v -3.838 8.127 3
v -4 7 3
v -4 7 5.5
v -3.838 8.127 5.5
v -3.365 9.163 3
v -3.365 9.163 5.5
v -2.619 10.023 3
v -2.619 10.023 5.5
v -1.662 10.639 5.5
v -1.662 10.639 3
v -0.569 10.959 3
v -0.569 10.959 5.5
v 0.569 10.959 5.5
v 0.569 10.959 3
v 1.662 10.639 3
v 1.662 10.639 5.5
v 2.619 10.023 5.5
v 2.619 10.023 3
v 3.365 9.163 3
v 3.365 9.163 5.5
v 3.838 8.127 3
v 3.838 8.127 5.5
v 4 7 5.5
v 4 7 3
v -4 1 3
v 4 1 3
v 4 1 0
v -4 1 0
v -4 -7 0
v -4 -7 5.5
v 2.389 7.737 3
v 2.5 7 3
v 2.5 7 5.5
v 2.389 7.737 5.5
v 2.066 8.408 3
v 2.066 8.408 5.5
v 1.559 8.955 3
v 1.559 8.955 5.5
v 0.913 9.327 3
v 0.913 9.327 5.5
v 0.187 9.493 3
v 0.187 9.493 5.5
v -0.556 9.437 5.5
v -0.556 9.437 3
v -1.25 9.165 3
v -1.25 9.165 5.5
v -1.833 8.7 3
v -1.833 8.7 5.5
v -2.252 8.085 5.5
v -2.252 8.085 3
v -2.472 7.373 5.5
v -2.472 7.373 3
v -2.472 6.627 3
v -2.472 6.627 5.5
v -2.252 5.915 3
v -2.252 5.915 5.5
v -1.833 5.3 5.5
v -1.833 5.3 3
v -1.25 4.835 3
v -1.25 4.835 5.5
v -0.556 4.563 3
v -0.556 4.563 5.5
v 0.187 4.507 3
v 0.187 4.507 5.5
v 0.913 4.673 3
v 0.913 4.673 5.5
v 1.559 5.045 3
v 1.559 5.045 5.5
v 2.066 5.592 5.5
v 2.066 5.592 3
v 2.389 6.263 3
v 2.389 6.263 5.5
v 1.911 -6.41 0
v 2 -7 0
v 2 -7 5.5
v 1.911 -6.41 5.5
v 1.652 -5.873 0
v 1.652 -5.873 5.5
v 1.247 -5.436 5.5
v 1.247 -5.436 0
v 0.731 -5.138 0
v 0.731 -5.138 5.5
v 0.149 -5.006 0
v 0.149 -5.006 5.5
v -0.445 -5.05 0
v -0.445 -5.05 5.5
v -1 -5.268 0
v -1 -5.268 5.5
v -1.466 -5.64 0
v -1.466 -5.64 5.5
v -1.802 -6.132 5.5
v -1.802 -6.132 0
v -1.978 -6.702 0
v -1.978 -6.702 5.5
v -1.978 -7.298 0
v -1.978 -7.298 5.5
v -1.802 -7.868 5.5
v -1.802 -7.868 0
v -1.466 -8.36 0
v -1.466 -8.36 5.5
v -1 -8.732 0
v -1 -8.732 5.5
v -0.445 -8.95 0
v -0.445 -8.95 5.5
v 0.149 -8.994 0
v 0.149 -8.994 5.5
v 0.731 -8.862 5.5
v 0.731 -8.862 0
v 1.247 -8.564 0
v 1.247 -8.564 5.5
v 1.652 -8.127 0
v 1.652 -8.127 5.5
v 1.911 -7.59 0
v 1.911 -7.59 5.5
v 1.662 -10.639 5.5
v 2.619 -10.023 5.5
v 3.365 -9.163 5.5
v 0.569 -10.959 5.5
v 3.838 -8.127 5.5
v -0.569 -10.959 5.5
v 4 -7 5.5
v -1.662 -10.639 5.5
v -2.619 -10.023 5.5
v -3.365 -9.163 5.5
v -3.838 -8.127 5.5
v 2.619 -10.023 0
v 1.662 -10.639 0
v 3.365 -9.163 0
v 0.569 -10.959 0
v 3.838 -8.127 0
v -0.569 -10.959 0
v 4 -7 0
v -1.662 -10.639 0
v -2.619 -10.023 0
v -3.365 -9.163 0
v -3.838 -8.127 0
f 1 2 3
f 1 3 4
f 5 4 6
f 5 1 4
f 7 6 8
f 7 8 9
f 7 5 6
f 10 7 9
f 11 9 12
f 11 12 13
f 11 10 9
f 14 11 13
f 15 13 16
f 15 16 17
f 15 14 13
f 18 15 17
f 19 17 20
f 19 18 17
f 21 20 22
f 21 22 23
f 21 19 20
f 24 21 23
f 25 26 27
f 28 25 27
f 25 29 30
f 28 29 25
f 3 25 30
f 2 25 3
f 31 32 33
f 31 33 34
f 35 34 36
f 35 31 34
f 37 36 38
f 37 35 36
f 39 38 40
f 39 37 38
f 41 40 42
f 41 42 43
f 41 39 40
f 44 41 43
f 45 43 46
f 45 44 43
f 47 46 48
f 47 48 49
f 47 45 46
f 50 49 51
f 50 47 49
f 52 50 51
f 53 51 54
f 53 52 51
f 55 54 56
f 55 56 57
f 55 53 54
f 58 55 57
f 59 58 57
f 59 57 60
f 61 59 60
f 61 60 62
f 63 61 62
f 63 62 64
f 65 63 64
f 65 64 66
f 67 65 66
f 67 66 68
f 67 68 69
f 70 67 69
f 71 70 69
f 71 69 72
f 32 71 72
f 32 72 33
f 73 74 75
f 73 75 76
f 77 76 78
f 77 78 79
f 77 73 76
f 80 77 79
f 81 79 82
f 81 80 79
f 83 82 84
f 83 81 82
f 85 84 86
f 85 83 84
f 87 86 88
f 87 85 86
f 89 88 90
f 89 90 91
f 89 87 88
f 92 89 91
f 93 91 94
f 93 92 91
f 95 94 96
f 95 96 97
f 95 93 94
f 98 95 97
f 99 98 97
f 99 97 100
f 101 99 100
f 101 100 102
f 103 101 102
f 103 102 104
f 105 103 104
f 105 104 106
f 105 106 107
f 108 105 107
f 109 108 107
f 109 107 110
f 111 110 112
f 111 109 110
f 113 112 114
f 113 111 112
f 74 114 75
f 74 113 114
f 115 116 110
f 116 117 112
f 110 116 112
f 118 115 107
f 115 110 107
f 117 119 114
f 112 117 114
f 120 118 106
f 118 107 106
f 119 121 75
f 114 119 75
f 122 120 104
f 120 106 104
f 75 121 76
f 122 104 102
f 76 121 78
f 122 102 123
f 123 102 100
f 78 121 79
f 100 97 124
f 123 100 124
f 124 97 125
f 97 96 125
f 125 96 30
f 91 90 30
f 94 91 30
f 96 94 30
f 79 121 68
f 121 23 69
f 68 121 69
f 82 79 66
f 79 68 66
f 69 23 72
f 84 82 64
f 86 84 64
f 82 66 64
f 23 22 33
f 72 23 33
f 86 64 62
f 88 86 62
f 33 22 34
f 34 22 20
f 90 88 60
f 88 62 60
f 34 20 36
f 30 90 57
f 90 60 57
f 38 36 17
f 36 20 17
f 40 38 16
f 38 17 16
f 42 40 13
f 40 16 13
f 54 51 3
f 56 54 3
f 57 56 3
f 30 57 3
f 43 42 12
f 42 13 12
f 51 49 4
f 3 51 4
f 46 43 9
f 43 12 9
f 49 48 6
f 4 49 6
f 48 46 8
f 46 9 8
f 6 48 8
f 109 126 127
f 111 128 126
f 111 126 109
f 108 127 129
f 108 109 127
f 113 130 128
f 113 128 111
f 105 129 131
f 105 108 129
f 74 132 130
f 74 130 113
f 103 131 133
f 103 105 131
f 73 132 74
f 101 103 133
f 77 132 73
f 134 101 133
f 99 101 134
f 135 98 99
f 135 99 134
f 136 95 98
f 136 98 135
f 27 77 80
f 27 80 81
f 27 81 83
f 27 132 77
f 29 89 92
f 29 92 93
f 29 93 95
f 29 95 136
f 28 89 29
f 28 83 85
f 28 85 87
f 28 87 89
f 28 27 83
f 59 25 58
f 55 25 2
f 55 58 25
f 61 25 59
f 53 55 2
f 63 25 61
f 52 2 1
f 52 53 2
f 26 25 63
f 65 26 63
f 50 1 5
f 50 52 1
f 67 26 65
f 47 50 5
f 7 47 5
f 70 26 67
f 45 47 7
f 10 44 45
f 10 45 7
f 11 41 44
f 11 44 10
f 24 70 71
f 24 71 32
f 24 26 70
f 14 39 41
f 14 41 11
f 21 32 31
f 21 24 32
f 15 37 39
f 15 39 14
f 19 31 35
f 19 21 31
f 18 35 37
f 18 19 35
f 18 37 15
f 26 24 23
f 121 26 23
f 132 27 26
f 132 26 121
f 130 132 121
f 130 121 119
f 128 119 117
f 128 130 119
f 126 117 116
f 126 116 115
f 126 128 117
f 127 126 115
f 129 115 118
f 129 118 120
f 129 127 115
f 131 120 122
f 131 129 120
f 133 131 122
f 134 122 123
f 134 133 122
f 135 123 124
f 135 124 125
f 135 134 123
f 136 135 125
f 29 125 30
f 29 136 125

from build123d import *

# Parameters (mm, degrees)
ESQUISSE1_R                  = 2
ESQUISSE1_R_2                = 2.5
BOSS_EXTRU_1_DEPTH           = 5.5
ESQUISSE2_W                  = 3
ESQUISSE2_H                  = 10
ENL_V_MAT_EXTRU_1_DEPTH      = 5
ENL_V_MAT_EXTRU_1_DEPTH_BACK = 5


with BuildPart() as part:
    # Esquisse1 → Boss.-Extru.1 (new body)
    with BuildSketch(Plane.XY):
        with BuildLine():
            Line((-4, -7), (-4, 7))
            ThreePointArc((-4, 7), (0, 11), (4, 7))
            Line((4, 7), (4, -7))
            ThreePointArc((4, -7), (0, -11), (-4, -7))
        make_face()
        with Locations((0, -7)):
            Circle(ESQUISSE1_R, mode=Mode.SUBTRACT)
        with Locations((0, 7)):
            Circle(ESQUISSE1_R_2, mode=Mode.SUBTRACT)
    extrude(amount=BOSS_EXTRU_1_DEPTH)

    # Esquisse2 → Enlèv. mat.-Extru.1 (cut, two sides)
    with BuildSketch(Plane(origin=(0, 0, 0), x_dir=(0, 0, -1), z_dir=(1, 0, 0))) as enl_v_mat_extru_1_sk:
        with Locations((-1.5, 6)):
            Rectangle(ESQUISSE2_W, ESQUISSE2_H)
    extrude(amount=ENL_V_MAT_EXTRU_1_DEPTH, mode=Mode.SUBTRACT)
    extrude(enl_v_mat_extru_1_sk.sketch, amount=-ENL_V_MAT_EXTRU_1_DEPTH_BACK, mode=Mode.SUBTRACT)


solid = part.part
